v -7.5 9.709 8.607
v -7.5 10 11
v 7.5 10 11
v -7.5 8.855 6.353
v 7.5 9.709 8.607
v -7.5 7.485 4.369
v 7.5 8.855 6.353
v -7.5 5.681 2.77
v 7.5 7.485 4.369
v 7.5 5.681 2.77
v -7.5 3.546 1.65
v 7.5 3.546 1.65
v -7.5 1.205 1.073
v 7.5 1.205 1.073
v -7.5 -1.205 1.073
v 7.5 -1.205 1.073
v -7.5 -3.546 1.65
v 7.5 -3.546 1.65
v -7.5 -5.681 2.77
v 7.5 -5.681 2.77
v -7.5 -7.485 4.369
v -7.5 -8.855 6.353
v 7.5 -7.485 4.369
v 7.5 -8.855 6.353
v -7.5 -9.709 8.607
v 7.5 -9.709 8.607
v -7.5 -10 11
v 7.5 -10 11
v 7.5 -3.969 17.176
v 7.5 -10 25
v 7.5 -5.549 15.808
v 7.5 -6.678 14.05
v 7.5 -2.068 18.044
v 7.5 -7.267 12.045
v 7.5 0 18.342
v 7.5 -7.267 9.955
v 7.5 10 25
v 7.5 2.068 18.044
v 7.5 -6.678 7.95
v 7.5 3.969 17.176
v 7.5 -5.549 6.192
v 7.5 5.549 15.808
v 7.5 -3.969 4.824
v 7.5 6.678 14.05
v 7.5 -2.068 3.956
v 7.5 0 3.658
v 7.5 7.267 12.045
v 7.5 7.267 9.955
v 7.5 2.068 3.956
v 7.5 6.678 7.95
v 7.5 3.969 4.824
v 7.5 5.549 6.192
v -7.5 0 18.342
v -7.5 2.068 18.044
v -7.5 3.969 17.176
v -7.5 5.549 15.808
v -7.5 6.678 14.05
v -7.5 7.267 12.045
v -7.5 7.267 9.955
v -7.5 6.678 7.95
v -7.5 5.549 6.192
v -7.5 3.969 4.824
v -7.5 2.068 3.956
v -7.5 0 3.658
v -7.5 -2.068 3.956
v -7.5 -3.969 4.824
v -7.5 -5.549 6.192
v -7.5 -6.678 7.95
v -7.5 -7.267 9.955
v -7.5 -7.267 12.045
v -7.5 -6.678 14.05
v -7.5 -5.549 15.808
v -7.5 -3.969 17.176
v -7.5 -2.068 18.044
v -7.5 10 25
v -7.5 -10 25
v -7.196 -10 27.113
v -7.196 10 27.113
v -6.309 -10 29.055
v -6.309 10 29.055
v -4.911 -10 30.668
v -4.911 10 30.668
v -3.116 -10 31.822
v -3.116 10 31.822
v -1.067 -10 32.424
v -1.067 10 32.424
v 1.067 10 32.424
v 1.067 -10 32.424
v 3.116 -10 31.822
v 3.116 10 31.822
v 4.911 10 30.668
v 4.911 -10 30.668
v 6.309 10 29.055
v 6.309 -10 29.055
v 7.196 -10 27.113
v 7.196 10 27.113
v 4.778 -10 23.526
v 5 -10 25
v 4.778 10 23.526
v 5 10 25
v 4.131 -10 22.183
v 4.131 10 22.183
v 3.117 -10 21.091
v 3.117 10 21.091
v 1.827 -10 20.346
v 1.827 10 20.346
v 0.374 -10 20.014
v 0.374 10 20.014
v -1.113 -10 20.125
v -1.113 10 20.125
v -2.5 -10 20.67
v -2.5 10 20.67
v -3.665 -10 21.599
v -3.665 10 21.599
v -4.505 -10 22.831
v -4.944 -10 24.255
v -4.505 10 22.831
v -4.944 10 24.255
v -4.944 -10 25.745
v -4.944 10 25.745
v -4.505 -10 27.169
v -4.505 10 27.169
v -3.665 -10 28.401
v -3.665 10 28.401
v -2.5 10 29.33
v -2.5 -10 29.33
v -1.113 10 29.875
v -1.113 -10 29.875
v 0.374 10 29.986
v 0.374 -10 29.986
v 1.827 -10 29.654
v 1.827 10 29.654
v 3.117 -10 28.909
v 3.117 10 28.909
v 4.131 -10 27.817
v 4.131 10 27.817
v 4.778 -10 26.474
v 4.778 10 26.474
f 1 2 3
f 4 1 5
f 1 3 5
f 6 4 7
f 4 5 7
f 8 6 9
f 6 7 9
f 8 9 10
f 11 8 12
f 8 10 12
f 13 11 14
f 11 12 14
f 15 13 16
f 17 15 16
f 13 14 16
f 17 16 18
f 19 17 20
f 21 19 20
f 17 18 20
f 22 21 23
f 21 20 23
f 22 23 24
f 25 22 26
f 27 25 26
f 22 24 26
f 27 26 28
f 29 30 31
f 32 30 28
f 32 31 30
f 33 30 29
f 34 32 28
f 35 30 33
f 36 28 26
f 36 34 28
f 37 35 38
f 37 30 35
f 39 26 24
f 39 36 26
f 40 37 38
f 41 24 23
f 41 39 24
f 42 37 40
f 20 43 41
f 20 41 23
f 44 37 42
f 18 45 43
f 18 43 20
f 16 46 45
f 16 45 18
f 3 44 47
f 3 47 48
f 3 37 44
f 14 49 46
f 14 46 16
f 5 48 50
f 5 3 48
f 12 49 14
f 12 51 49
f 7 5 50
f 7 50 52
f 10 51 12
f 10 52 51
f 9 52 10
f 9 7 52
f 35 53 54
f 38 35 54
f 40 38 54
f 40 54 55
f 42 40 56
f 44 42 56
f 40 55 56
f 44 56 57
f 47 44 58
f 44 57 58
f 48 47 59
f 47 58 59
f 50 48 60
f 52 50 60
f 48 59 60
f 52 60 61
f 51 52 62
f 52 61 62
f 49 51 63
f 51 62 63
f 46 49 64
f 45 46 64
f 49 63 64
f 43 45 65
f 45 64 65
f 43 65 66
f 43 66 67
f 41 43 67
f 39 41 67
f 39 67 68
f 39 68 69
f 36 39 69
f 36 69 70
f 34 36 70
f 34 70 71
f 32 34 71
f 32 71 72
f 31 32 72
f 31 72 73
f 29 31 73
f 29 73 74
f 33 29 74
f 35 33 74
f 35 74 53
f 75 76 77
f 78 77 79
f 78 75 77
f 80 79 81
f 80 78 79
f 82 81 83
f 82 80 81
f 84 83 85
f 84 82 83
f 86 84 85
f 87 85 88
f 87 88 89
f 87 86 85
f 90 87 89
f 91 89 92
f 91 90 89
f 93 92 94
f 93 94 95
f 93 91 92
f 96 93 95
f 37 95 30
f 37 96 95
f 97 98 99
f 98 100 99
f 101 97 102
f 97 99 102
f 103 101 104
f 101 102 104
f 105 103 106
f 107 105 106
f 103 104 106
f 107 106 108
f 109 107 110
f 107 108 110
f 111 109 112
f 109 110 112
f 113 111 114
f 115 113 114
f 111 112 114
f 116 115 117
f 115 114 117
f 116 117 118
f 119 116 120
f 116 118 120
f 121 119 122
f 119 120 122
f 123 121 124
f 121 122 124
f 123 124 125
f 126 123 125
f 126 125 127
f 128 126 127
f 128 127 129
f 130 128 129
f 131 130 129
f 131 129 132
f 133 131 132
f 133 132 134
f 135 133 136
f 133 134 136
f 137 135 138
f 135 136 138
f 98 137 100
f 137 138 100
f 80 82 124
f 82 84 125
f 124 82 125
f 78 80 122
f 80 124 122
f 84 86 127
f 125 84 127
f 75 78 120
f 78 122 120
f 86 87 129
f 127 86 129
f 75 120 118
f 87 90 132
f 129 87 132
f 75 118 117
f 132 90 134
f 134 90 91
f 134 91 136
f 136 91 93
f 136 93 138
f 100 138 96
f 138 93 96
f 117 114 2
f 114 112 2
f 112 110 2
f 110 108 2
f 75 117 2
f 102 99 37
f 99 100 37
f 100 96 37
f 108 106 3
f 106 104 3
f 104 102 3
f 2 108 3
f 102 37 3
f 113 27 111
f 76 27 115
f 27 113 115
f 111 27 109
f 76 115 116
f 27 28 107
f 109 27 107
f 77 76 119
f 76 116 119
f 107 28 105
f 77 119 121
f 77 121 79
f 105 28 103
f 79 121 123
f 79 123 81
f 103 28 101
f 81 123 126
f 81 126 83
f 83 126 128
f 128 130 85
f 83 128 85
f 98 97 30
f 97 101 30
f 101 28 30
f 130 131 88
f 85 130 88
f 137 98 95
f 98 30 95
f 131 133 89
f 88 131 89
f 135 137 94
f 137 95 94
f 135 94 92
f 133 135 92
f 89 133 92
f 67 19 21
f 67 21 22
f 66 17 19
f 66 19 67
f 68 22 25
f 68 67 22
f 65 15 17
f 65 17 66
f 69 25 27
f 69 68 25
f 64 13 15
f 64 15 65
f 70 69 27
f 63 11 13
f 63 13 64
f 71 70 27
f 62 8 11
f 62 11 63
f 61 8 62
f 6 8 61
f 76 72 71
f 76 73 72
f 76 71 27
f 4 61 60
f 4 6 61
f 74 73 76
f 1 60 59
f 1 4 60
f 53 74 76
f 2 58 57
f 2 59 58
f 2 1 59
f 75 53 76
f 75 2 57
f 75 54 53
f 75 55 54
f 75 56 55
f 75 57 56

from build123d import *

# Parameters (mm, degrees)
SKETCH1_W               = 22
SKETCH1_H               = 22
EXTRUDE1_DEPTH          = 40
EXTRUDE2_DEPTH          = 12
EXTRUDE2_DEPTH_BACK     = 12
SKETCH3_R               = 5
EXTRUDE3_DEPTH          = 11
EXTRUDE3_DEPTH_BACK     = 11
F_5_8_18_TAPPED_HOLE1_D = 14.68374


with BuildPart() as part:
    # Sketch1 → Extrude1 (new body)
    with BuildSketch(Plane.XY):
        Rectangle(SKETCH1_W, SKETCH1_H)
    extrude(amount=EXTRUDE1_DEPTH)

    # Sketch2 → Extrude2 (cut, two sides)
    with BuildSketch(Plane(origin=(0, 0, 0), x_dir=(0, 0, -1), z_dir=(1, 0, 0))) as extrude2_sk:
        with BuildLine():
            Line((-11, -10), (-49.420419849, -10))
            Line((-49.420419849, -10), (-49.420419849, -16.887372299))
            Line((-49.420419849, -16.887372299), (-11, -16.887372299))
            Line((-11, -16.887372299), (8.616222101, -16.887372299))
            Line((8.616222101, -16.887372299), (8.616222101, 23.046405641))
            Line((8.616222101, 23.046405641), (-11, 23.046405641))
            Line((-11, 23.046405641), (-49.420419849, 23.046405641))
            Line((-49.420419849, 23.046405641), (-49.420419849, 10))
            Line((-49.420419849, 10), (-11, 10))
            ThreePointArc((-11, 10), (-1, 0), (-11, -10))
        make_face()
    extrude(amount=EXTRUDE2_DEPTH, mode=Mode.SUBTRACT)
    extrude(extrude2_sk.sketch, amount=-EXTRUDE2_DEPTH_BACK, mode=Mode.SUBTRACT)

    # Sketch3 → Extrude3 (cut, two sides)
    with BuildSketch(Plane(origin=(0, 0, 0), x_dir=(1, 0, 0), z_dir=(0, 1, 0))) as extrude3_sk:
        with Locations((0, -25)):
            Circle(SKETCH3_R)
        with BuildLine():
            Line((-18.844545226, 6.847618329), (-7.5, 6.847618329))
            Line((-7.5, 6.847618329), (-7.5, -25))
            ThreePointArc((-7.5, -25), (0, -32.5), (7.5, -25))
            Line((7.5, -25), (7.5, 6.847618329))
            Line((7.5, 6.847618329), (23.30888992, 6.847618329))
            Line((23.30888992, 6.847618329), (23.30888992, -44.330247861))
            Line((23.30888992, -44.330247861), (-18.844545226, -44.330247861))
            Line((-18.844545226, -44.330247861), (-18.844545226, 6.847618329))
        make_face()
    extrude(amount=EXTRUDE3_DEPTH, mode=Mode.SUBTRACT)
    extrude(extrude3_sk.sketch, amount=-EXTRUDE3_DEPTH_BACK, mode=Mode.SUBTRACT)

    # 5/8-18 Tapped Hole1 (through all)
    with Locations(Plane(origin=(7.5, 0, 0), x_dir=(0, 0, -1), z_dir=(1, 0, 0))):
        with Locations((-11, 0)):
            Hole(F_5_8_18_TAPPED_HOLE1_D / 2)


solid = part.part
